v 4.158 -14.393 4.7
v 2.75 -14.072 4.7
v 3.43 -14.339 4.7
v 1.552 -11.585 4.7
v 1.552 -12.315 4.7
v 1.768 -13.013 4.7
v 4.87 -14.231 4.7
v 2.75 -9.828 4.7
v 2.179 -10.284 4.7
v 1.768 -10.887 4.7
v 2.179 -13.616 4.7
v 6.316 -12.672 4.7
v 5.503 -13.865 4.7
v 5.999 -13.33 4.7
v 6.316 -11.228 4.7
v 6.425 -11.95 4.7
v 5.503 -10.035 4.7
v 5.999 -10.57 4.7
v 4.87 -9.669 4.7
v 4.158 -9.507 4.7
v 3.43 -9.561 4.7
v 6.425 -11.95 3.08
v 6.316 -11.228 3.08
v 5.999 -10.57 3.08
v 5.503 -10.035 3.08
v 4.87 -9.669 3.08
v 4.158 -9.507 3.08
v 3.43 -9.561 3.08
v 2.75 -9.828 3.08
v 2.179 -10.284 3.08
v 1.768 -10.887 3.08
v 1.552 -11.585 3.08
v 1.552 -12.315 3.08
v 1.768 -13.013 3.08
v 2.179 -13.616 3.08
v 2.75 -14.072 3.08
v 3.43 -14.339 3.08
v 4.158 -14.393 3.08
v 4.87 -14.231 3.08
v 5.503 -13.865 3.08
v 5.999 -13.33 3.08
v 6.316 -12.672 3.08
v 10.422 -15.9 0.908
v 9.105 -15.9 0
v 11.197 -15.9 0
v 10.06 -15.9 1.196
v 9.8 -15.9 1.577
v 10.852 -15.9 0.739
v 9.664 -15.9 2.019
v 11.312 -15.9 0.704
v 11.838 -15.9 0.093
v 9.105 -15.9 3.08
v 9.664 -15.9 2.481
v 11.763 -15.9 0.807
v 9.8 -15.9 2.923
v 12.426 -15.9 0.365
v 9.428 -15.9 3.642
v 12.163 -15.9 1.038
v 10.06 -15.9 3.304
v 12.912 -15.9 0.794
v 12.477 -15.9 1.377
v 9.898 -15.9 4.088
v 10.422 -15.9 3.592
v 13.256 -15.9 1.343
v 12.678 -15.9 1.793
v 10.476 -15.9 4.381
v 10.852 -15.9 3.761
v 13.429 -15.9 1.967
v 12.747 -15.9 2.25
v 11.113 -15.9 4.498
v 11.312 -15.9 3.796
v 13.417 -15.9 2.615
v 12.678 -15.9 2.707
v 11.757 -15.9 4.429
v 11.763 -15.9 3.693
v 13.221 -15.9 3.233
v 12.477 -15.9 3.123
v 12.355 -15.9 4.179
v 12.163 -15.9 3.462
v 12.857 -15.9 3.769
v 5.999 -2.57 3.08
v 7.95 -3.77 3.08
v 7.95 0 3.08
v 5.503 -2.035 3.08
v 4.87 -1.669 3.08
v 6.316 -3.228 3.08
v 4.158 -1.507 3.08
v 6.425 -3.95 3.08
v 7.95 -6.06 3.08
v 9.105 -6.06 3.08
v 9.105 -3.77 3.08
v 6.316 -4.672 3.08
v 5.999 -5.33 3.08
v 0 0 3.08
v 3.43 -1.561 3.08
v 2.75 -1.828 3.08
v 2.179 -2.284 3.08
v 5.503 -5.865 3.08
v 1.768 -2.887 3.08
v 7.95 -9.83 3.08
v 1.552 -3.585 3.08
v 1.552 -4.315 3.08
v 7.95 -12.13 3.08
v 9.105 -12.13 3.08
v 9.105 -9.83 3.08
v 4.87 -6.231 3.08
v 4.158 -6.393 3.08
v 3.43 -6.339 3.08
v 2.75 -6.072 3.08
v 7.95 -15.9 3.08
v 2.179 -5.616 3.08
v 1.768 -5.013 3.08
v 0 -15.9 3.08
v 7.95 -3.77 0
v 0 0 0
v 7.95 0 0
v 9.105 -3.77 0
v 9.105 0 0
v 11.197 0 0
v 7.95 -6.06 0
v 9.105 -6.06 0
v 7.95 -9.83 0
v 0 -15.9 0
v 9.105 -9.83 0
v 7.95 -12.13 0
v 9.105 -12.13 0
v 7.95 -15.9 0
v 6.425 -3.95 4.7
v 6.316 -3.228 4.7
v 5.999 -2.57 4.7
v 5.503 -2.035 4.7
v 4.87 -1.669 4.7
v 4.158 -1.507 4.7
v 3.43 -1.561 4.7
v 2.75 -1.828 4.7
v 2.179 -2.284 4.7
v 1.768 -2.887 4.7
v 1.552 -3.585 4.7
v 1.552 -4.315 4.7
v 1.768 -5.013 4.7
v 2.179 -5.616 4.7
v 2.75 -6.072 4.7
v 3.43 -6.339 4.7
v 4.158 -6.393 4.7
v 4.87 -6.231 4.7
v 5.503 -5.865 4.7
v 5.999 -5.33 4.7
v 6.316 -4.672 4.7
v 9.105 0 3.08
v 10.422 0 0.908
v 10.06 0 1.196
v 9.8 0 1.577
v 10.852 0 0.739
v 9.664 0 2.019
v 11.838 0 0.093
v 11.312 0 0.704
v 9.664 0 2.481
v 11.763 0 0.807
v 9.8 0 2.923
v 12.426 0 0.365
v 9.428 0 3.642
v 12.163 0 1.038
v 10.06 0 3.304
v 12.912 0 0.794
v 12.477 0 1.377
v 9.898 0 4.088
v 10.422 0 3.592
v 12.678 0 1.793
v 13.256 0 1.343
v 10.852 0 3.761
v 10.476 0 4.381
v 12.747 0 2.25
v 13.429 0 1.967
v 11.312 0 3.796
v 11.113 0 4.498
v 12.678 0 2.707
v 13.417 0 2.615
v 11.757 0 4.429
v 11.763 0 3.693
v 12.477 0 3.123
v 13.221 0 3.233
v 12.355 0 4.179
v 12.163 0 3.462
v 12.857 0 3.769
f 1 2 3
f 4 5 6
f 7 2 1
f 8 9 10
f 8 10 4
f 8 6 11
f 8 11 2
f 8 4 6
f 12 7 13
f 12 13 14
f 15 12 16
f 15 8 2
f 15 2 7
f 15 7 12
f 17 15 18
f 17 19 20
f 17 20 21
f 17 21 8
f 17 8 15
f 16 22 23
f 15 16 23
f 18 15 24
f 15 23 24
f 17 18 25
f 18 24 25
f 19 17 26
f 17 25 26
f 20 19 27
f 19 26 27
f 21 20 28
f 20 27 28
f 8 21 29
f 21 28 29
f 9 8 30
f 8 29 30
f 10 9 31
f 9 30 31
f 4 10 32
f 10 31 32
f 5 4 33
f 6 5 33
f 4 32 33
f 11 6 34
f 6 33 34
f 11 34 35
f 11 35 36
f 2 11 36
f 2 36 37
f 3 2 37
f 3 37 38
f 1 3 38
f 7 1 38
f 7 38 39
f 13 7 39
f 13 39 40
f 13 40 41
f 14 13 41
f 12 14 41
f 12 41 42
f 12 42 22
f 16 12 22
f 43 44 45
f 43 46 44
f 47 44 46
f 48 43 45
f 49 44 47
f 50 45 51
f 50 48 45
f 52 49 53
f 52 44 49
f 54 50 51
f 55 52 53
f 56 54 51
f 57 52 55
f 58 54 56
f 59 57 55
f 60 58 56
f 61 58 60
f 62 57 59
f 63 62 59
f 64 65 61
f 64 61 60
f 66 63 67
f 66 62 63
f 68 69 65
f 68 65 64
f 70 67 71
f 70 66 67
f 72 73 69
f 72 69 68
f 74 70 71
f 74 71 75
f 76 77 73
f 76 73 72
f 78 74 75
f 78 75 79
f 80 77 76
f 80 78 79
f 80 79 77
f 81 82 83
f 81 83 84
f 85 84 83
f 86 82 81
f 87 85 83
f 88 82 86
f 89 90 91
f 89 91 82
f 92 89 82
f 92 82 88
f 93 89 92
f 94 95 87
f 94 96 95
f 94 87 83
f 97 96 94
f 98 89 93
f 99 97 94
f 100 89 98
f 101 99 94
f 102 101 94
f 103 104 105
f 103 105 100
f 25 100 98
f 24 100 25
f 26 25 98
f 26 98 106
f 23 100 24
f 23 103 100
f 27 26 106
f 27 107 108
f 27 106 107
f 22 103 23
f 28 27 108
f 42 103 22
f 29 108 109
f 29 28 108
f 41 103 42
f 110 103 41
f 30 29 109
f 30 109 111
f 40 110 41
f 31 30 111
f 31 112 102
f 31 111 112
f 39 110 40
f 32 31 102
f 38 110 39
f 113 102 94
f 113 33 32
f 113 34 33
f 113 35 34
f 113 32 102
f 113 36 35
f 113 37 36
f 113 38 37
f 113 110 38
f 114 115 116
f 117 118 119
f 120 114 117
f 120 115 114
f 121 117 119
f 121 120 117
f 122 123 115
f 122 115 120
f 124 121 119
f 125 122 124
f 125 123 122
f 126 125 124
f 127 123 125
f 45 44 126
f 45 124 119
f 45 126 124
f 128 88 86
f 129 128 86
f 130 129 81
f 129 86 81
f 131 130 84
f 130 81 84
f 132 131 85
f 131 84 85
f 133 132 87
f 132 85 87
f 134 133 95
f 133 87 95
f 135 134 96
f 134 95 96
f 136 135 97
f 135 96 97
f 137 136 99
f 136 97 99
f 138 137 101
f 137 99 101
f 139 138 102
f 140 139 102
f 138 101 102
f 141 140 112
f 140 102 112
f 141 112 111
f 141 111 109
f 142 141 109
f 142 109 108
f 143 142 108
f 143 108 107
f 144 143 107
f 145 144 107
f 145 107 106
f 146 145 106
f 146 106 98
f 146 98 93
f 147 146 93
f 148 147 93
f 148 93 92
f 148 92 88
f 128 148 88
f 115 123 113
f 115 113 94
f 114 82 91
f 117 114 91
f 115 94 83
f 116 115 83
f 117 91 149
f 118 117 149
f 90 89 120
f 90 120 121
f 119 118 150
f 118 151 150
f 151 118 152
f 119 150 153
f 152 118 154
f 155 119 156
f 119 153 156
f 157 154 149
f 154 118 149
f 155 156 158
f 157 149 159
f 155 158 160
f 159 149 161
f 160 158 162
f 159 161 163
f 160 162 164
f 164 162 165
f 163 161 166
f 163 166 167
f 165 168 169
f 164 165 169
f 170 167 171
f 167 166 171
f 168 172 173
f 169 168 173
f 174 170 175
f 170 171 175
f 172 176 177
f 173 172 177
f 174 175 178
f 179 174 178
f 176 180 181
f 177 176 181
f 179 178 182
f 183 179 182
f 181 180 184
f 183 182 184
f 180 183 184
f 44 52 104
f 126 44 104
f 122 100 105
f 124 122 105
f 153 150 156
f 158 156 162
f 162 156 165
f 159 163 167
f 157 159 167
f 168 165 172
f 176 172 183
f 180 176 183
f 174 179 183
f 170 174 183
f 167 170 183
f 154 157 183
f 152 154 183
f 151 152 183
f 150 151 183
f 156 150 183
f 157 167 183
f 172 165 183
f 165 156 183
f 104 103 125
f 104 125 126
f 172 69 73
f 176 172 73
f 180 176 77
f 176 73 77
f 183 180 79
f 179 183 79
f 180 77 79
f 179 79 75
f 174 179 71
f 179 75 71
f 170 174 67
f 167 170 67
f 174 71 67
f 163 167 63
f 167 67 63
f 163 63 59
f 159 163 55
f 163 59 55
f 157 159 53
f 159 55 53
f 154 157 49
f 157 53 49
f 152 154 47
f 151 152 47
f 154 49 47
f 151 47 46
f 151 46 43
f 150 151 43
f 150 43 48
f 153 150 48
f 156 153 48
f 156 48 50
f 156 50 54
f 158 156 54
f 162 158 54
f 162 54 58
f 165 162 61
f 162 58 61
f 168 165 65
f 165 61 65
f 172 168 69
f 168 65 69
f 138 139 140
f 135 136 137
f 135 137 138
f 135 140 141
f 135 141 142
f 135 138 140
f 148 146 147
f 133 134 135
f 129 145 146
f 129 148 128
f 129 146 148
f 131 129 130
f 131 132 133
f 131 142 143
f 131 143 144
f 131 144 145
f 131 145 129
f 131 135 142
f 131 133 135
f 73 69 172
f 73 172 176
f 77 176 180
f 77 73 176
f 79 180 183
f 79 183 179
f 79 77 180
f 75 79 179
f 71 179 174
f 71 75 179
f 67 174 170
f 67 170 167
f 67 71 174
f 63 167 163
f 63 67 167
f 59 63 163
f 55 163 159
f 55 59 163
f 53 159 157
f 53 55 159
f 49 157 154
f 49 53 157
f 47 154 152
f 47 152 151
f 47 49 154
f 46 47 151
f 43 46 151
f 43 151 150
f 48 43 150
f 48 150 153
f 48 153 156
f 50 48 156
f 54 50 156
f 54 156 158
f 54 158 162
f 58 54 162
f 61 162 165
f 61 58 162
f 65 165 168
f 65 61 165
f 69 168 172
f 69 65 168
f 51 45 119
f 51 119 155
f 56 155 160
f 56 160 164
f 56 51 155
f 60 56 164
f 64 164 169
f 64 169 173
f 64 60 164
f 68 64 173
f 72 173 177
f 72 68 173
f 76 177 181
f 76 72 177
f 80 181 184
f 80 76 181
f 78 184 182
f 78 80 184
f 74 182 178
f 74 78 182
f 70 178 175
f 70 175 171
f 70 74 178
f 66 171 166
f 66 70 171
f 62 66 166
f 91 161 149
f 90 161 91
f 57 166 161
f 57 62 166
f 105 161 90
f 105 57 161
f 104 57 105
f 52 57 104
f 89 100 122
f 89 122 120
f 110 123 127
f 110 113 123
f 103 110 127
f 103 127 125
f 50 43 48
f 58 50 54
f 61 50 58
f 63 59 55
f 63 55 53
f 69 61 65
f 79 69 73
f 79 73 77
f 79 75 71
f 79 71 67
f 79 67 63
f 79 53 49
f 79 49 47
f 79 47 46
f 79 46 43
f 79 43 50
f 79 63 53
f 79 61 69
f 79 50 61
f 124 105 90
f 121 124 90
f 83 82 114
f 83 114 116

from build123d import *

# Parameters (mm, degrees)
F0_W     = 7.95
F0_H     = 15.9
F0_R     = 2.45
F1_DEPTH = 3.08
F2_DEPTH = 4.7
F3_R     = 1.55
F4_DEPTH = 15.9
F5_W     = 1.1552212406
F5_H     = 3.77
F6_DEPTH = 25
F7_DEPTH = 15.9
F8_R     = 1.5205459649
F9_DEPTH = 3.77


with BuildPart() as f1:
    # F0 (on Top) → F1 (new body)
    with BuildSketch(Plane.XY):
        with Locations((3.975, -7.95)):
            Rectangle(F0_W, F0_H)
        with Locations((3.975, -11.95)):
            Circle(F0_R, mode=Mode.SUBTRACT)
        with Locations((3.975, -3.95)):
            Circle(F0_R, mode=Mode.SUBTRACT)
    extrude(amount=F1_DEPTH)

    # F0 (on Top) → F2 (join)
    with BuildSketch(Plane.XY):
        with Locations((3.975, -11.95)):
            Circle(F0_R)
        with Locations((3.975, -3.95)):
            Circle(F0_R)
    extrude(amount=F2_DEPTH)

    # F3 (on face) → F4 (join)
    with BuildSketch(Plane.XZ.offset(15.9)):
        with BuildLine():
            Line((7.95, 0), (11.1965366161, 0))
            ThreePointArc((11.1965366161, 0), (13.057987663, 3.513922466), (9.1052212406, 3.08))
            Line((9.1052212406, 3.08), (7.95, 3.08))
            Line((7.95, 3.08), (7.95, 0))
        make_face()
        with Locations((11.1965366161, 2.25)):
            Circle(F3_R, mode=Mode.SUBTRACT)
    extrude(amount=-F4_DEPTH)

    # F5 (on face) → F6 (cut)
    with BuildSketch(Plane.XY.offset(3.08)):
        with Locations((8.5276106203, -1.885)):
            Rectangle(F5_W, F5_H)
        with Locations((8.5276106203, -14.015)):
            Rectangle(F5_W, F5_H)
        with Locations((8.5276106203, -7.945)):
            Rectangle(F5_W, F5_H)
    extrude(amount=-F6_DEPTH, mode=Mode.SUBTRACT)

    # F8 (on face) → F9 (cut)
    with BuildSketch(Plane.XZ.offset(15.9)):
        with BuildLine():
            Line((9.1052212406, 0), (10.5373981893, 0))
            ThreePointArc((10.5373981893, 0), (12.6789284615, 4.0664464987), (9.1243527191, 1.1531785184))
            Line((9.1243527191, 1.1531785184), (9.1052212406, 0))
        make_face()
        with Locations((11.1965366161, 2.25)):
            Circle(F8_R, mode=Mode.SUBTRACT)
    extrude(amount=F9_DEPTH, mode=Mode.SUBTRACT)


with BuildPart() as f7:
    # F3 (on face) → F7 (new body)
    with BuildSketch(Plane.XZ.offset(15.9)):
        with Locations((11.1965366161, 2.25)):
            Circle(F3_R)
    extrude(amount=-F7_DEPTH)


solid = Compound([f1.part, f7.part])
